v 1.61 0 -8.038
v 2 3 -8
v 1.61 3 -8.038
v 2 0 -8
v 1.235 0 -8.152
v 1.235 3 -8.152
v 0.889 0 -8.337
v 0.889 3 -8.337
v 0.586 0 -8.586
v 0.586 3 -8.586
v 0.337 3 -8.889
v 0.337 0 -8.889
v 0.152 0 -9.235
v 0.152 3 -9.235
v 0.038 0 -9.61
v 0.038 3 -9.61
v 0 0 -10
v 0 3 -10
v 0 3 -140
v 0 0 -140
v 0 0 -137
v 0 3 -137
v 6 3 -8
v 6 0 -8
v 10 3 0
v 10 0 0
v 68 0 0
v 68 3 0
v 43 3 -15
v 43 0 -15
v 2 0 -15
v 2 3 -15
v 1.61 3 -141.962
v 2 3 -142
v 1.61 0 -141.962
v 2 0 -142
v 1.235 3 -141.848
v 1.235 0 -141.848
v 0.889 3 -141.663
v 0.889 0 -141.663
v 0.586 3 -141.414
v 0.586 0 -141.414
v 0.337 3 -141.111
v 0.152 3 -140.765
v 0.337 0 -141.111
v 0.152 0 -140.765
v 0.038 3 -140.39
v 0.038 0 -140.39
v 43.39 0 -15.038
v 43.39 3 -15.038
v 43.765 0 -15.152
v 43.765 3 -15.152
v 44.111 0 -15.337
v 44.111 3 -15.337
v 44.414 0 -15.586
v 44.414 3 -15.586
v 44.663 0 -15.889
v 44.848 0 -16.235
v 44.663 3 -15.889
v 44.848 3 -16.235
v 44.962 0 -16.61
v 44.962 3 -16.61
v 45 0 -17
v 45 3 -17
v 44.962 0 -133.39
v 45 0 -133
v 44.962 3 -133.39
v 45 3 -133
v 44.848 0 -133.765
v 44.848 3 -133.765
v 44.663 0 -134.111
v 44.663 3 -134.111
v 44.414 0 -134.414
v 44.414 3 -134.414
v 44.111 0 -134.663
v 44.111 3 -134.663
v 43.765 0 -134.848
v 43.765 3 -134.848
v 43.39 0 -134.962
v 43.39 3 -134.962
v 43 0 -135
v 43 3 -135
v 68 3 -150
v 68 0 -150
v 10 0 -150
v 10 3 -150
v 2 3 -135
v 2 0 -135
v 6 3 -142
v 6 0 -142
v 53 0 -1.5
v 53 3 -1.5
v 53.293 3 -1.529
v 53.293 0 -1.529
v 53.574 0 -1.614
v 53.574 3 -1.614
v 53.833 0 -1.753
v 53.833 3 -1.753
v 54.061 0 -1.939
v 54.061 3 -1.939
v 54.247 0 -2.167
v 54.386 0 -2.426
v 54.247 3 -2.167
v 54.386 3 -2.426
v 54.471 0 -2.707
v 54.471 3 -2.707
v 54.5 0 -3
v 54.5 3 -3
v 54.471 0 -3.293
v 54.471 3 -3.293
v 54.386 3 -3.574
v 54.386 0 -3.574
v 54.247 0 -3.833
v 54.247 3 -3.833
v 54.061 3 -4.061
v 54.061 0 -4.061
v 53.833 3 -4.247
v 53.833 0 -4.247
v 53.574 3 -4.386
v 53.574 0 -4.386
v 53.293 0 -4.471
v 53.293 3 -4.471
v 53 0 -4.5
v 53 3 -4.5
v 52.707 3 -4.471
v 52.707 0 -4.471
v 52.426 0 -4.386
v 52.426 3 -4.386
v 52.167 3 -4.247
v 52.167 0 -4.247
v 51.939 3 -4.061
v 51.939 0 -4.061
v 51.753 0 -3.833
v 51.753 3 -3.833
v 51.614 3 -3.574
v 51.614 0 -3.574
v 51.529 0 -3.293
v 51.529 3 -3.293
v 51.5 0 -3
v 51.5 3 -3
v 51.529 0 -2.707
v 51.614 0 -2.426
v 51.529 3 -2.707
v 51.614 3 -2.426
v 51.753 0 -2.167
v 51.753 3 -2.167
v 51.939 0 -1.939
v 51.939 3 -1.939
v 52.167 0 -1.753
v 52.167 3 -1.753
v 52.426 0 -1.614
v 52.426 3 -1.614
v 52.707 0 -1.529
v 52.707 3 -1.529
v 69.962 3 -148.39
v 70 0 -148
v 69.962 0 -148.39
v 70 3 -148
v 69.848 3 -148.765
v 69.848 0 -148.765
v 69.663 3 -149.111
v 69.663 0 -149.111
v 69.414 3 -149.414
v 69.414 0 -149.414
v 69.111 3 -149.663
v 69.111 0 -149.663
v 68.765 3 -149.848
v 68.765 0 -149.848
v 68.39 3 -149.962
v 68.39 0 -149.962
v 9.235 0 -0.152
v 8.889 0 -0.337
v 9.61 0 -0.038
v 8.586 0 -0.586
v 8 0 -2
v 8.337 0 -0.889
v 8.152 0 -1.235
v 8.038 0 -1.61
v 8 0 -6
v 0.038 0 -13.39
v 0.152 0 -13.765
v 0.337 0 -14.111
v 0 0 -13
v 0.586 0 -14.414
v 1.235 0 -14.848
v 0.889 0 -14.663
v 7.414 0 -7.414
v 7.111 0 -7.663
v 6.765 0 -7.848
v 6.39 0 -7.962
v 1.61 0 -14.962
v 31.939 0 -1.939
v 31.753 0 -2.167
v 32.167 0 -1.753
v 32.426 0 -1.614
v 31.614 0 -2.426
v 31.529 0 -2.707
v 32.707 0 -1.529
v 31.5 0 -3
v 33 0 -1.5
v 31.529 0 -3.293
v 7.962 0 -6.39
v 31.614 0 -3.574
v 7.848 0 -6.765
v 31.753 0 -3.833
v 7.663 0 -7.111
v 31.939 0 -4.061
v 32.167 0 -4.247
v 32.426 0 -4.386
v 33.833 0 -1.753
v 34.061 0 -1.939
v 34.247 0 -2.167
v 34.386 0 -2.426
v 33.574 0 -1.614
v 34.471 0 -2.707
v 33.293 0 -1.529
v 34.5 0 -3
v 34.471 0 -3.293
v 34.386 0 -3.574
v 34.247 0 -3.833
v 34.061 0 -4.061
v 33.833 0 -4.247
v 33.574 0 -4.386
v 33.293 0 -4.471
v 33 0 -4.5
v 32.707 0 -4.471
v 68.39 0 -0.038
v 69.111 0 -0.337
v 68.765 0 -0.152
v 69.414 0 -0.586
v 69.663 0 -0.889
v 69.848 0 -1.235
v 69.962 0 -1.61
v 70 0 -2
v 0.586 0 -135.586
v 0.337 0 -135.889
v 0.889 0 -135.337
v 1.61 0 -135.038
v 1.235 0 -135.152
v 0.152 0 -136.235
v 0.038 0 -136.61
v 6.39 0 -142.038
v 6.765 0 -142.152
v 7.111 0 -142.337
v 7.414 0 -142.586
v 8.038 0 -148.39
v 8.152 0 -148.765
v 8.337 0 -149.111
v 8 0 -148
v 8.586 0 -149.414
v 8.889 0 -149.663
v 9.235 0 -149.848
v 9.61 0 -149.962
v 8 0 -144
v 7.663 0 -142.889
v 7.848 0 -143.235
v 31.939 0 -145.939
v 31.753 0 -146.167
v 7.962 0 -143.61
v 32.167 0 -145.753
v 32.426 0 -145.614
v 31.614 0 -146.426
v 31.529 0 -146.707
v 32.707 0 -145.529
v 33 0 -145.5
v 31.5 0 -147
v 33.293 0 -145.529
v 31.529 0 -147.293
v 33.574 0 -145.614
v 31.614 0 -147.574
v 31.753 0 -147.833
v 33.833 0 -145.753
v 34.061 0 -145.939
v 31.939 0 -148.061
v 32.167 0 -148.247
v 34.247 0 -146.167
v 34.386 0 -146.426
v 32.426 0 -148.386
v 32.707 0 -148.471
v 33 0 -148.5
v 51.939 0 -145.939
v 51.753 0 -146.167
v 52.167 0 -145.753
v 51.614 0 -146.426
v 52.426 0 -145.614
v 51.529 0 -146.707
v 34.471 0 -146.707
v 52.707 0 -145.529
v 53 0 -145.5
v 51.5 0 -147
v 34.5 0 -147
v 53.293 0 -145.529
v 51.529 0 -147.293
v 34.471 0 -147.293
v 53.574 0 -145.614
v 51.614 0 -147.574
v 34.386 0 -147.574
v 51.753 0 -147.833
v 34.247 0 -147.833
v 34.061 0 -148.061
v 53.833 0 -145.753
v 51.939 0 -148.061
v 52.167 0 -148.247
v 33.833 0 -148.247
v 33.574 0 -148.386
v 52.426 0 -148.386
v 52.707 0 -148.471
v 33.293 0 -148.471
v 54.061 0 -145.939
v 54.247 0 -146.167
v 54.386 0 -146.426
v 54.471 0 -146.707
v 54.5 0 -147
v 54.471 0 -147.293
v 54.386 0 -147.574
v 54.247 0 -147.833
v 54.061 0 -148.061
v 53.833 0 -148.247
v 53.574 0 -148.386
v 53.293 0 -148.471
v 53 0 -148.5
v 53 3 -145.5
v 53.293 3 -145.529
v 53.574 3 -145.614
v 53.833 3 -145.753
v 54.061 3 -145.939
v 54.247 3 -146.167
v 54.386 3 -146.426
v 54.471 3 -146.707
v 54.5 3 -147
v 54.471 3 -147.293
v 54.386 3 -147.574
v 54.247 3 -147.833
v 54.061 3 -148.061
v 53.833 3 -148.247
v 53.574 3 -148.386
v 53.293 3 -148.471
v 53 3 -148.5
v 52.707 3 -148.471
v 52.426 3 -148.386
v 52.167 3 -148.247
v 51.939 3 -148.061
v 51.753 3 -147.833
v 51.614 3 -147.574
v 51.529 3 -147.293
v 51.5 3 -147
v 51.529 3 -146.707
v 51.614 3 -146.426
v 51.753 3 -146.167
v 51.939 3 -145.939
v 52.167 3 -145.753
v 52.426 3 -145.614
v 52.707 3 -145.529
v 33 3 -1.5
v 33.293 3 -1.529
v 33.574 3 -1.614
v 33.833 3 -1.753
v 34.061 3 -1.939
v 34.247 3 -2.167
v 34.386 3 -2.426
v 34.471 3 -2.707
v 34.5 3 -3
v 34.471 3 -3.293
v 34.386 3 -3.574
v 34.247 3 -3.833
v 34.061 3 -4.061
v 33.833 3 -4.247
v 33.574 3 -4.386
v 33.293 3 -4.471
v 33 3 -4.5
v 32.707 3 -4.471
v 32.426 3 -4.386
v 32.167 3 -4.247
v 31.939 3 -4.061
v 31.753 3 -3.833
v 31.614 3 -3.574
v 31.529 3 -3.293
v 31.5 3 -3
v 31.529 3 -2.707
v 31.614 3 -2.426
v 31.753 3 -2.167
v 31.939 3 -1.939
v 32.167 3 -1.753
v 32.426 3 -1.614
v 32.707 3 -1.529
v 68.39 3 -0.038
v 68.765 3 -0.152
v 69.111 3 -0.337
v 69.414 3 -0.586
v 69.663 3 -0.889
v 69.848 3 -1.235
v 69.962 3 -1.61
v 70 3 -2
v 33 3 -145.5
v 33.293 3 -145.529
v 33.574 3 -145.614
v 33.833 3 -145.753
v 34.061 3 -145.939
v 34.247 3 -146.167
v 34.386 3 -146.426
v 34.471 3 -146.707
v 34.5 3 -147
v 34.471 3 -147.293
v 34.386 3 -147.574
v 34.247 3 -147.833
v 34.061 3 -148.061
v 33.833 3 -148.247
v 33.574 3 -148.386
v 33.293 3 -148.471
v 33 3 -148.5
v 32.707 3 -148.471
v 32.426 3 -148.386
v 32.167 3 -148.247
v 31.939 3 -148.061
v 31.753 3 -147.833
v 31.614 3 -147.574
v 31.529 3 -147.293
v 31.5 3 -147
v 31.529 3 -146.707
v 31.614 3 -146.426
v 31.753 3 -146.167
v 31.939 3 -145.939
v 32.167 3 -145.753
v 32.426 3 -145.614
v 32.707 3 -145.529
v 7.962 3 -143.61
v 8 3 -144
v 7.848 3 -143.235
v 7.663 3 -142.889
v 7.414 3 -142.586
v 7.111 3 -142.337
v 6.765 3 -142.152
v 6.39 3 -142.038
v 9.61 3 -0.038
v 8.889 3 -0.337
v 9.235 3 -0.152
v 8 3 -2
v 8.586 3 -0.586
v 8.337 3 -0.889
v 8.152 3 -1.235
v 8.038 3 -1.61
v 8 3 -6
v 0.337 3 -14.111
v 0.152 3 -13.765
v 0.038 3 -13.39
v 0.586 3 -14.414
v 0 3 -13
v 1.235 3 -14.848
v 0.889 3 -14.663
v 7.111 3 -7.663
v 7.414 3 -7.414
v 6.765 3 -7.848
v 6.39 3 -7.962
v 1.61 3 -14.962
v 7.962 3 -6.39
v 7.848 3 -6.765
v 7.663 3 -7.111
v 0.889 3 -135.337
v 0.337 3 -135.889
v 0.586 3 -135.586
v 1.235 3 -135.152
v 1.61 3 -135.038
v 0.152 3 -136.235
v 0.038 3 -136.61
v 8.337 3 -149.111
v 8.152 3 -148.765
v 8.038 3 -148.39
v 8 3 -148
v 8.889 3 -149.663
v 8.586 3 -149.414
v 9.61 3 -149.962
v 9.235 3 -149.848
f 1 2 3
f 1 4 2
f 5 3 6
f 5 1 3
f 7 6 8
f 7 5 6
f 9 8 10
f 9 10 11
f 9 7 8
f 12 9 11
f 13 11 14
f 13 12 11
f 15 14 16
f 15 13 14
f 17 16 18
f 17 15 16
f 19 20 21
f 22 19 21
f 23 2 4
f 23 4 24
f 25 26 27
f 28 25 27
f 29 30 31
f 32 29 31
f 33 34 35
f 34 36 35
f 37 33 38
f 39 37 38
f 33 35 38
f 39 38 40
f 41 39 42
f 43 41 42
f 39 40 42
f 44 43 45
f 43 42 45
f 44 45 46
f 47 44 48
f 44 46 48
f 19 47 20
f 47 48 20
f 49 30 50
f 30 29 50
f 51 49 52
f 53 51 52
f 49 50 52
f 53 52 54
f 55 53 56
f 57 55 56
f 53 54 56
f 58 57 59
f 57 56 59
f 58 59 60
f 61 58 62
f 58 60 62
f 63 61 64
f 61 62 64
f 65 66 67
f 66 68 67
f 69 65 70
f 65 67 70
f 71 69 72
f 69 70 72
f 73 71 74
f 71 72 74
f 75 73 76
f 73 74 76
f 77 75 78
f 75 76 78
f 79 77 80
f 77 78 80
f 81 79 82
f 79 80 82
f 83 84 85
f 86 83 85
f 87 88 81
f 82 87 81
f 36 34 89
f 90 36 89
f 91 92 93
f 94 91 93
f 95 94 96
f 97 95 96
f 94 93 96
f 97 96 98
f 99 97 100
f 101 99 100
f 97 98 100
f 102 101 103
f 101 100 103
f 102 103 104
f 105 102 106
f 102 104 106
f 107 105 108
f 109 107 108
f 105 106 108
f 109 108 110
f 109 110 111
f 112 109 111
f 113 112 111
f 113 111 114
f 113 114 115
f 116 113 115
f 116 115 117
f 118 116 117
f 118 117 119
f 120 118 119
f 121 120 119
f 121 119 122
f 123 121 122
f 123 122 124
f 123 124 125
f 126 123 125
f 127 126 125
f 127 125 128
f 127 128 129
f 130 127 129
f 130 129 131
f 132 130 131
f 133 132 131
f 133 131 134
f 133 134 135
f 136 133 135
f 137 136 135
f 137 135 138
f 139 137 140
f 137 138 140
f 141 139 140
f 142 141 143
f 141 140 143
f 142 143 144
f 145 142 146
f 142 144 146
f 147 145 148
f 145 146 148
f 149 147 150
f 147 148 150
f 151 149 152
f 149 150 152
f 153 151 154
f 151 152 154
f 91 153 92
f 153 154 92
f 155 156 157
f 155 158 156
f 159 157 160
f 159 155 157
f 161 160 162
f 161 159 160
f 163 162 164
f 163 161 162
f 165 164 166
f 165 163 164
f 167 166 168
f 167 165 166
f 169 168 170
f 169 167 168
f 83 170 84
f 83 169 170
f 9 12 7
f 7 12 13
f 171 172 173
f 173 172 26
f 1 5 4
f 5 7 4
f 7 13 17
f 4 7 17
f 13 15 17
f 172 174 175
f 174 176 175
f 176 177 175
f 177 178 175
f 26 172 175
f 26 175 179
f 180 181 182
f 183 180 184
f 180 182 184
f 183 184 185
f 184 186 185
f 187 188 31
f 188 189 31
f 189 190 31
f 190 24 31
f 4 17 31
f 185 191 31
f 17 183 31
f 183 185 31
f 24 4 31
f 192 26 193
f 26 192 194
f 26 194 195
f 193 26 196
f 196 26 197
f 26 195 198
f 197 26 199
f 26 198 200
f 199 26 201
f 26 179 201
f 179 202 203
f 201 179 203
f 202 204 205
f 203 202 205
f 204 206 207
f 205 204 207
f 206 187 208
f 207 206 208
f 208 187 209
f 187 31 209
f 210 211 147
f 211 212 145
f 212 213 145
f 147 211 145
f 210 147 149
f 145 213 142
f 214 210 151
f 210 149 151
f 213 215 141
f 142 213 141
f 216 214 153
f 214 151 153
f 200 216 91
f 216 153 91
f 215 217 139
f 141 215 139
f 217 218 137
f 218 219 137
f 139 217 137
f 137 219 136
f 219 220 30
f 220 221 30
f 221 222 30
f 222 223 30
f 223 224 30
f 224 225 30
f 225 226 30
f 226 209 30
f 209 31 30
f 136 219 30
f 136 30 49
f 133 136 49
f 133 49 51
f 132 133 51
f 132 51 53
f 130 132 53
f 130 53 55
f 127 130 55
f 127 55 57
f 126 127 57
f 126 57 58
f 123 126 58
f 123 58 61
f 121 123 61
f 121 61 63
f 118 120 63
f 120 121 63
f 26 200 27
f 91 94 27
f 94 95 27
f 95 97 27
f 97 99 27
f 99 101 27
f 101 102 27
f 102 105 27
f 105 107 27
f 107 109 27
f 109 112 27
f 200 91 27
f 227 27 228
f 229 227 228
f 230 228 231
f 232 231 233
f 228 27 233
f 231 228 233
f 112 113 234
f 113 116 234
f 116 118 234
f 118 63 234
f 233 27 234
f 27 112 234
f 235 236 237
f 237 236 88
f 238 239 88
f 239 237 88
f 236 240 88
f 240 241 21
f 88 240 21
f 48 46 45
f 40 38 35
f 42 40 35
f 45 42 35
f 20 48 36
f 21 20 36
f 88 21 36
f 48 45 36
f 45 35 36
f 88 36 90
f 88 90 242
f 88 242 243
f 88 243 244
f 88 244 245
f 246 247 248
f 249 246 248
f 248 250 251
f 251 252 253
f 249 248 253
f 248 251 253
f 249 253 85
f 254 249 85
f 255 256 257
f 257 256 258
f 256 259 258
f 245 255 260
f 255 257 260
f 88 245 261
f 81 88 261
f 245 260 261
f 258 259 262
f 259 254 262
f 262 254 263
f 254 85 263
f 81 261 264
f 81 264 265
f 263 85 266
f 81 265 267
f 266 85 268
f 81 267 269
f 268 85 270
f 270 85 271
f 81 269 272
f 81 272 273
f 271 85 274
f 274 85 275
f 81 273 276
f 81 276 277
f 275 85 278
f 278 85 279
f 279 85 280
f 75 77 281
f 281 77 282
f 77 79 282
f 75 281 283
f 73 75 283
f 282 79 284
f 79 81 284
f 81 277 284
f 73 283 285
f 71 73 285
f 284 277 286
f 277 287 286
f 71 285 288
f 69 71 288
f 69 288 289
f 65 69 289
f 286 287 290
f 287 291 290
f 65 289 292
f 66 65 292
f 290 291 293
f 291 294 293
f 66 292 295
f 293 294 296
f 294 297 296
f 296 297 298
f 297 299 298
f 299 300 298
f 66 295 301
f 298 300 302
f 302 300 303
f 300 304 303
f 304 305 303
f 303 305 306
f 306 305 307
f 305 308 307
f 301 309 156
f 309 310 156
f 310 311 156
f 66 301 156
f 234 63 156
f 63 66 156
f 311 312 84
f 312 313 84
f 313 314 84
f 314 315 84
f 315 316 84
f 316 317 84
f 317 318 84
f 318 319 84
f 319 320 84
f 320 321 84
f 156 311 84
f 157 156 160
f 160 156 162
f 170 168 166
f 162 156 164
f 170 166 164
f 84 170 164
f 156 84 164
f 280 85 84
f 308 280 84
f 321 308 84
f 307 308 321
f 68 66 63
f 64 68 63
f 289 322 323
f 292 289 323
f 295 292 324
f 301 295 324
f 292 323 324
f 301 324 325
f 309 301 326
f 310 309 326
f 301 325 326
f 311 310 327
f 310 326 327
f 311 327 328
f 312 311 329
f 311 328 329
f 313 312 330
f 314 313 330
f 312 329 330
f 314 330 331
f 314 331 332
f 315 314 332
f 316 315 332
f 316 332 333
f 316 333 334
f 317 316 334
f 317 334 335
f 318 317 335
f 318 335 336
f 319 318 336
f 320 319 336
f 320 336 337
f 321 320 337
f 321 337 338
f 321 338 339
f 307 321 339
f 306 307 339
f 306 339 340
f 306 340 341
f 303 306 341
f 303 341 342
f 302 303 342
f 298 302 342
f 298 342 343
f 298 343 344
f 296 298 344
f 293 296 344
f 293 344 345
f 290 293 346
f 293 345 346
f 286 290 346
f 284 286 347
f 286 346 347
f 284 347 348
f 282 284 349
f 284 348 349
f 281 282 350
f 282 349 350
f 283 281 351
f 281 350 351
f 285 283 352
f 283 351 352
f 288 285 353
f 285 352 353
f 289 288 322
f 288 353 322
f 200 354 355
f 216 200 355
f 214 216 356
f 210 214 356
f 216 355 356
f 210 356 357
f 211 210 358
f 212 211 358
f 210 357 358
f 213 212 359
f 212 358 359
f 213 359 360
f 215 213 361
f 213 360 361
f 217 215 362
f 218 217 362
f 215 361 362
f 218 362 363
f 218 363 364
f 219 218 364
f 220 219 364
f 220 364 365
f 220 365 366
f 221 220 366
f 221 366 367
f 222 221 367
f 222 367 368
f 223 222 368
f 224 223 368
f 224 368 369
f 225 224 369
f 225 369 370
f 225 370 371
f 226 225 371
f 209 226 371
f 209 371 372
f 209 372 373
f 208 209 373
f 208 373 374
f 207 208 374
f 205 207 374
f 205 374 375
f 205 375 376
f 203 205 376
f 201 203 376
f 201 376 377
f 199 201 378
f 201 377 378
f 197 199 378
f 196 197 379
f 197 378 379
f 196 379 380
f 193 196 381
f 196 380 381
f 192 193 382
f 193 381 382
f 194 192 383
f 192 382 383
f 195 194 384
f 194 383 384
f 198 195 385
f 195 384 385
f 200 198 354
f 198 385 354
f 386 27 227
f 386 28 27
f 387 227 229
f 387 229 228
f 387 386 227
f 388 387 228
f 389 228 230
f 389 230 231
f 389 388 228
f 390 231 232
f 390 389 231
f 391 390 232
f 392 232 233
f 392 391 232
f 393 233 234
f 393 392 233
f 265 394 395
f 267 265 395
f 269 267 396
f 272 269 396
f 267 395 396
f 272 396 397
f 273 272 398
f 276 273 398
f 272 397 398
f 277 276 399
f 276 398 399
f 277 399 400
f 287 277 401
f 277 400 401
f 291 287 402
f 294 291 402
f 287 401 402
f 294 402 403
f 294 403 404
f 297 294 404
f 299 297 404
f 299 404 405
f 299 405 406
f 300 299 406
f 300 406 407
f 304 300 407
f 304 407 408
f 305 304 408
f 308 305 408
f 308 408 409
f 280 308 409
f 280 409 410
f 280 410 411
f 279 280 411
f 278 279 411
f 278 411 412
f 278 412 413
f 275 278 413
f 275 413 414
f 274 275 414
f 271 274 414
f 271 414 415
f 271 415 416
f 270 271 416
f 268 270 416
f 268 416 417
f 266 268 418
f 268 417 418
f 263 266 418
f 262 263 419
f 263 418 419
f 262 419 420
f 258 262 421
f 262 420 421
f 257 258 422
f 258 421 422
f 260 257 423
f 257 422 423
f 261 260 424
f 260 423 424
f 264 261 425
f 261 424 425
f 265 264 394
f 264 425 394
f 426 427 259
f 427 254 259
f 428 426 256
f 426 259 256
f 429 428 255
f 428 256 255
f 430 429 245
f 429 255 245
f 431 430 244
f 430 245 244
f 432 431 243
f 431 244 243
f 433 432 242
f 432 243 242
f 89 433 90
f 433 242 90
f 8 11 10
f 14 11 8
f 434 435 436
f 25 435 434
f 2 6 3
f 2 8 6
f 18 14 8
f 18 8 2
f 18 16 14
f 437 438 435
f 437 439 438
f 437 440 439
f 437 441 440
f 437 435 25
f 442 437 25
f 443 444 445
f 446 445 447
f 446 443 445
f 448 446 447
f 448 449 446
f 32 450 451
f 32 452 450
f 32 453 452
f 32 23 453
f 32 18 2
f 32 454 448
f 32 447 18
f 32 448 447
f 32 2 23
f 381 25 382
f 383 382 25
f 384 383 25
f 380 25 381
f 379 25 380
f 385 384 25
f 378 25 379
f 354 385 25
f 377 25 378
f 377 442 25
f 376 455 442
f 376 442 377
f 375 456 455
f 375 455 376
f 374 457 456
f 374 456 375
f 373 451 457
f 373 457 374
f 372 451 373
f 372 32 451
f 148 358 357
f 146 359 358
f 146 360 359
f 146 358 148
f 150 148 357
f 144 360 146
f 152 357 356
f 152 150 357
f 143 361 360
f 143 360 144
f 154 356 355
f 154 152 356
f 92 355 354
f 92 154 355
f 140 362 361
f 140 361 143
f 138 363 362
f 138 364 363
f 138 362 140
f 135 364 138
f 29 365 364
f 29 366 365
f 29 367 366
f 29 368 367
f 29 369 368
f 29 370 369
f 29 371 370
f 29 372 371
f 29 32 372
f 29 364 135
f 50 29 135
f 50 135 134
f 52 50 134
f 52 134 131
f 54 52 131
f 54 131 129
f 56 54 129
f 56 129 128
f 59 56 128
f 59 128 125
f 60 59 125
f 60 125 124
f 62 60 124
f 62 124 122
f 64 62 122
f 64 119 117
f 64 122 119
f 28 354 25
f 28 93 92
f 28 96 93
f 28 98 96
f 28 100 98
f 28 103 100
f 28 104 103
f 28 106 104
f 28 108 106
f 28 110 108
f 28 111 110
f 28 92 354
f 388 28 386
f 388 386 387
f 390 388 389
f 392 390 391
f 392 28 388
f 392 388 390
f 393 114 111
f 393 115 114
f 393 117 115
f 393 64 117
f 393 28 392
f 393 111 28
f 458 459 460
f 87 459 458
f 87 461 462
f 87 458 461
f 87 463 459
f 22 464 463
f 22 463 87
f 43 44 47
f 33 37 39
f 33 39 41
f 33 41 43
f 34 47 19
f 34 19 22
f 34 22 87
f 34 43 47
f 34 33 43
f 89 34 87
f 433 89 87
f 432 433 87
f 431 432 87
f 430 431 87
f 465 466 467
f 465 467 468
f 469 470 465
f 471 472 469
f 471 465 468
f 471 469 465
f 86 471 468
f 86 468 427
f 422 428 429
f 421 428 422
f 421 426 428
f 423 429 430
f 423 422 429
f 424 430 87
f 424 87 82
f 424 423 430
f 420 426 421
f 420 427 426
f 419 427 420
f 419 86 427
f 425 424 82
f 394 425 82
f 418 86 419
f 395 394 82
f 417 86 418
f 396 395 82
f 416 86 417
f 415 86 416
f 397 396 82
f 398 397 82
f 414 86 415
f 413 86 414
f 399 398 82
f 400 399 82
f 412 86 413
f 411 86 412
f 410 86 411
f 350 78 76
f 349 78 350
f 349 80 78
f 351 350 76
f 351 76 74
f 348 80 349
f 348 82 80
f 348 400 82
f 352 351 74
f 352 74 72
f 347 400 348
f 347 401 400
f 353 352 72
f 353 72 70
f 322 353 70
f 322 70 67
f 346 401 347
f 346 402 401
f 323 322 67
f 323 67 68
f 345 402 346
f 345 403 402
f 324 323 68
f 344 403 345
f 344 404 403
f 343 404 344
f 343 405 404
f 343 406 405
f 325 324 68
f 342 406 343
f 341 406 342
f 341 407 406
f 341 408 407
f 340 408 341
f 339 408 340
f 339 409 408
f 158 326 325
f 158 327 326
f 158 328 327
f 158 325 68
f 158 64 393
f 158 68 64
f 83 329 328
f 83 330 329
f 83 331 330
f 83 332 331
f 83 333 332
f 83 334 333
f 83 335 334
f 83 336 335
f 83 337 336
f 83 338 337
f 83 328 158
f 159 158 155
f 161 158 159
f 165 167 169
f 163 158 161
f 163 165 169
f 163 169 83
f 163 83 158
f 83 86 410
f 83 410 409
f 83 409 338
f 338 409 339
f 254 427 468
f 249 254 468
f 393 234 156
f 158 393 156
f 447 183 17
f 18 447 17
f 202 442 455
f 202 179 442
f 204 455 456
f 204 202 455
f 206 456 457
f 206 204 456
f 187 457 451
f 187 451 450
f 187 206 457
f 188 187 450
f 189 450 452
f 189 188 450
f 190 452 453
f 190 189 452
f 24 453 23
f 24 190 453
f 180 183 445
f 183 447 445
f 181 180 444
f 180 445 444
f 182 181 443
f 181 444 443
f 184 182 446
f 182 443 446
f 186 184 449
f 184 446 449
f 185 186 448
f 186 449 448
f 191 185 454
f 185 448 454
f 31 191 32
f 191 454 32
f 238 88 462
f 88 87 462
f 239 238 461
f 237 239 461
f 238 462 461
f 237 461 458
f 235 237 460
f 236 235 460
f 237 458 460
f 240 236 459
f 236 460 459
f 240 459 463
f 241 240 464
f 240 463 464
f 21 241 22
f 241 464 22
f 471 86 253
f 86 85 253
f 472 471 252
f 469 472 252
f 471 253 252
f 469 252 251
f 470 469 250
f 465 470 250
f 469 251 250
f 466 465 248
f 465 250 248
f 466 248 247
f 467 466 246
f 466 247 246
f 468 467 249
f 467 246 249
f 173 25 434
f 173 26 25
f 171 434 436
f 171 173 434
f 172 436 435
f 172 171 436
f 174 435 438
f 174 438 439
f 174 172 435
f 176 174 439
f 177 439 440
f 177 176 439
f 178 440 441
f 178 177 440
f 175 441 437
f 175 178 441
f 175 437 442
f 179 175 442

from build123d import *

# Parameters (mm, degrees)
EXTRUDE_1_DEPTH     = 3
SKETCH_2_W          = 8
SKETCH_2_H          = 8
CUT_EXTRUDE_1_DEPTH = 10
SKETCH_3_R          = 1.5
CUT_EXTRUDE_2_DEPTH = 10
FILLET_1_R          = 2


with BuildPart() as part:
    # 草图1 → 凸台-拉伸1 (new body)
    with BuildSketch(Plane(origin=(0, 0, 0), x_dir=(1, 0, 0), z_dir=(0, 1, 0))):
        Polygon((0, 0), (70, 0), (70, 150), (0, 150), (0, 135), (45, 135), (45, 15), (0, 15), align=None)
    extrude(amount=EXTRUDE_1_DEPTH)

    # 草图2 → 切除-拉伸1 (cut)
    with BuildSketch(Plane(origin=(0, 3, 0), x_dir=(1, 0, 0), z_dir=(0, 1, 0))):
        with Locations((4, 4)):
            Rectangle(SKETCH_2_W, SKETCH_2_H)
        with Locations((4, 146)):
            Rectangle(SKETCH_2_W, SKETCH_2_H)
    extrude(amount=-CUT_EXTRUDE_1_DEPTH, mode=Mode.SUBTRACT)

    # 草图3 → 切除-拉伸2 (cut)
    with BuildSketch(Plane(origin=(0, 3, 0), x_dir=(1, 0, 0), z_dir=(0, 1, 0))):
        with Locations(Location((33, 3, 0), (0, 0, 270))):
            Circle(SKETCH_3_R)
        with Locations(Location((53, 3, 0), (0, 0, 270))):
            Circle(SKETCH_3_R)
        with Locations(Location((53, 147, 0), (0, 0, 270))):
            Circle(SKETCH_3_R)
        with Locations(Location((33, 147, 0), (0, 0, 270))):
            Circle(SKETCH_3_R)
    extrude(amount=-CUT_EXTRUDE_2_DEPTH, mode=Mode.SUBTRACT)

    # 圆角1
    fillet_1_edges = [part.edges().sort_by_distance(p)[0] for p in [
        (0, 1.5, -15),
        (45, 1.5, -15),
        (45, 1.5, -135),
        (0, 1.5, -135),
        (70, 1.5, -150),
        (70, 1.5, 0),
        (8, 1.5, 0),
        (0, 1.5, -8),
        (8, 1.5, -8),
        (0, 1.5, -142),
        (8, 1.5, -150),
        (8, 1.5, -142),
    ]]
    fillet(fillet_1_edges, radius=FILLET_1_R)


solid = part.part
